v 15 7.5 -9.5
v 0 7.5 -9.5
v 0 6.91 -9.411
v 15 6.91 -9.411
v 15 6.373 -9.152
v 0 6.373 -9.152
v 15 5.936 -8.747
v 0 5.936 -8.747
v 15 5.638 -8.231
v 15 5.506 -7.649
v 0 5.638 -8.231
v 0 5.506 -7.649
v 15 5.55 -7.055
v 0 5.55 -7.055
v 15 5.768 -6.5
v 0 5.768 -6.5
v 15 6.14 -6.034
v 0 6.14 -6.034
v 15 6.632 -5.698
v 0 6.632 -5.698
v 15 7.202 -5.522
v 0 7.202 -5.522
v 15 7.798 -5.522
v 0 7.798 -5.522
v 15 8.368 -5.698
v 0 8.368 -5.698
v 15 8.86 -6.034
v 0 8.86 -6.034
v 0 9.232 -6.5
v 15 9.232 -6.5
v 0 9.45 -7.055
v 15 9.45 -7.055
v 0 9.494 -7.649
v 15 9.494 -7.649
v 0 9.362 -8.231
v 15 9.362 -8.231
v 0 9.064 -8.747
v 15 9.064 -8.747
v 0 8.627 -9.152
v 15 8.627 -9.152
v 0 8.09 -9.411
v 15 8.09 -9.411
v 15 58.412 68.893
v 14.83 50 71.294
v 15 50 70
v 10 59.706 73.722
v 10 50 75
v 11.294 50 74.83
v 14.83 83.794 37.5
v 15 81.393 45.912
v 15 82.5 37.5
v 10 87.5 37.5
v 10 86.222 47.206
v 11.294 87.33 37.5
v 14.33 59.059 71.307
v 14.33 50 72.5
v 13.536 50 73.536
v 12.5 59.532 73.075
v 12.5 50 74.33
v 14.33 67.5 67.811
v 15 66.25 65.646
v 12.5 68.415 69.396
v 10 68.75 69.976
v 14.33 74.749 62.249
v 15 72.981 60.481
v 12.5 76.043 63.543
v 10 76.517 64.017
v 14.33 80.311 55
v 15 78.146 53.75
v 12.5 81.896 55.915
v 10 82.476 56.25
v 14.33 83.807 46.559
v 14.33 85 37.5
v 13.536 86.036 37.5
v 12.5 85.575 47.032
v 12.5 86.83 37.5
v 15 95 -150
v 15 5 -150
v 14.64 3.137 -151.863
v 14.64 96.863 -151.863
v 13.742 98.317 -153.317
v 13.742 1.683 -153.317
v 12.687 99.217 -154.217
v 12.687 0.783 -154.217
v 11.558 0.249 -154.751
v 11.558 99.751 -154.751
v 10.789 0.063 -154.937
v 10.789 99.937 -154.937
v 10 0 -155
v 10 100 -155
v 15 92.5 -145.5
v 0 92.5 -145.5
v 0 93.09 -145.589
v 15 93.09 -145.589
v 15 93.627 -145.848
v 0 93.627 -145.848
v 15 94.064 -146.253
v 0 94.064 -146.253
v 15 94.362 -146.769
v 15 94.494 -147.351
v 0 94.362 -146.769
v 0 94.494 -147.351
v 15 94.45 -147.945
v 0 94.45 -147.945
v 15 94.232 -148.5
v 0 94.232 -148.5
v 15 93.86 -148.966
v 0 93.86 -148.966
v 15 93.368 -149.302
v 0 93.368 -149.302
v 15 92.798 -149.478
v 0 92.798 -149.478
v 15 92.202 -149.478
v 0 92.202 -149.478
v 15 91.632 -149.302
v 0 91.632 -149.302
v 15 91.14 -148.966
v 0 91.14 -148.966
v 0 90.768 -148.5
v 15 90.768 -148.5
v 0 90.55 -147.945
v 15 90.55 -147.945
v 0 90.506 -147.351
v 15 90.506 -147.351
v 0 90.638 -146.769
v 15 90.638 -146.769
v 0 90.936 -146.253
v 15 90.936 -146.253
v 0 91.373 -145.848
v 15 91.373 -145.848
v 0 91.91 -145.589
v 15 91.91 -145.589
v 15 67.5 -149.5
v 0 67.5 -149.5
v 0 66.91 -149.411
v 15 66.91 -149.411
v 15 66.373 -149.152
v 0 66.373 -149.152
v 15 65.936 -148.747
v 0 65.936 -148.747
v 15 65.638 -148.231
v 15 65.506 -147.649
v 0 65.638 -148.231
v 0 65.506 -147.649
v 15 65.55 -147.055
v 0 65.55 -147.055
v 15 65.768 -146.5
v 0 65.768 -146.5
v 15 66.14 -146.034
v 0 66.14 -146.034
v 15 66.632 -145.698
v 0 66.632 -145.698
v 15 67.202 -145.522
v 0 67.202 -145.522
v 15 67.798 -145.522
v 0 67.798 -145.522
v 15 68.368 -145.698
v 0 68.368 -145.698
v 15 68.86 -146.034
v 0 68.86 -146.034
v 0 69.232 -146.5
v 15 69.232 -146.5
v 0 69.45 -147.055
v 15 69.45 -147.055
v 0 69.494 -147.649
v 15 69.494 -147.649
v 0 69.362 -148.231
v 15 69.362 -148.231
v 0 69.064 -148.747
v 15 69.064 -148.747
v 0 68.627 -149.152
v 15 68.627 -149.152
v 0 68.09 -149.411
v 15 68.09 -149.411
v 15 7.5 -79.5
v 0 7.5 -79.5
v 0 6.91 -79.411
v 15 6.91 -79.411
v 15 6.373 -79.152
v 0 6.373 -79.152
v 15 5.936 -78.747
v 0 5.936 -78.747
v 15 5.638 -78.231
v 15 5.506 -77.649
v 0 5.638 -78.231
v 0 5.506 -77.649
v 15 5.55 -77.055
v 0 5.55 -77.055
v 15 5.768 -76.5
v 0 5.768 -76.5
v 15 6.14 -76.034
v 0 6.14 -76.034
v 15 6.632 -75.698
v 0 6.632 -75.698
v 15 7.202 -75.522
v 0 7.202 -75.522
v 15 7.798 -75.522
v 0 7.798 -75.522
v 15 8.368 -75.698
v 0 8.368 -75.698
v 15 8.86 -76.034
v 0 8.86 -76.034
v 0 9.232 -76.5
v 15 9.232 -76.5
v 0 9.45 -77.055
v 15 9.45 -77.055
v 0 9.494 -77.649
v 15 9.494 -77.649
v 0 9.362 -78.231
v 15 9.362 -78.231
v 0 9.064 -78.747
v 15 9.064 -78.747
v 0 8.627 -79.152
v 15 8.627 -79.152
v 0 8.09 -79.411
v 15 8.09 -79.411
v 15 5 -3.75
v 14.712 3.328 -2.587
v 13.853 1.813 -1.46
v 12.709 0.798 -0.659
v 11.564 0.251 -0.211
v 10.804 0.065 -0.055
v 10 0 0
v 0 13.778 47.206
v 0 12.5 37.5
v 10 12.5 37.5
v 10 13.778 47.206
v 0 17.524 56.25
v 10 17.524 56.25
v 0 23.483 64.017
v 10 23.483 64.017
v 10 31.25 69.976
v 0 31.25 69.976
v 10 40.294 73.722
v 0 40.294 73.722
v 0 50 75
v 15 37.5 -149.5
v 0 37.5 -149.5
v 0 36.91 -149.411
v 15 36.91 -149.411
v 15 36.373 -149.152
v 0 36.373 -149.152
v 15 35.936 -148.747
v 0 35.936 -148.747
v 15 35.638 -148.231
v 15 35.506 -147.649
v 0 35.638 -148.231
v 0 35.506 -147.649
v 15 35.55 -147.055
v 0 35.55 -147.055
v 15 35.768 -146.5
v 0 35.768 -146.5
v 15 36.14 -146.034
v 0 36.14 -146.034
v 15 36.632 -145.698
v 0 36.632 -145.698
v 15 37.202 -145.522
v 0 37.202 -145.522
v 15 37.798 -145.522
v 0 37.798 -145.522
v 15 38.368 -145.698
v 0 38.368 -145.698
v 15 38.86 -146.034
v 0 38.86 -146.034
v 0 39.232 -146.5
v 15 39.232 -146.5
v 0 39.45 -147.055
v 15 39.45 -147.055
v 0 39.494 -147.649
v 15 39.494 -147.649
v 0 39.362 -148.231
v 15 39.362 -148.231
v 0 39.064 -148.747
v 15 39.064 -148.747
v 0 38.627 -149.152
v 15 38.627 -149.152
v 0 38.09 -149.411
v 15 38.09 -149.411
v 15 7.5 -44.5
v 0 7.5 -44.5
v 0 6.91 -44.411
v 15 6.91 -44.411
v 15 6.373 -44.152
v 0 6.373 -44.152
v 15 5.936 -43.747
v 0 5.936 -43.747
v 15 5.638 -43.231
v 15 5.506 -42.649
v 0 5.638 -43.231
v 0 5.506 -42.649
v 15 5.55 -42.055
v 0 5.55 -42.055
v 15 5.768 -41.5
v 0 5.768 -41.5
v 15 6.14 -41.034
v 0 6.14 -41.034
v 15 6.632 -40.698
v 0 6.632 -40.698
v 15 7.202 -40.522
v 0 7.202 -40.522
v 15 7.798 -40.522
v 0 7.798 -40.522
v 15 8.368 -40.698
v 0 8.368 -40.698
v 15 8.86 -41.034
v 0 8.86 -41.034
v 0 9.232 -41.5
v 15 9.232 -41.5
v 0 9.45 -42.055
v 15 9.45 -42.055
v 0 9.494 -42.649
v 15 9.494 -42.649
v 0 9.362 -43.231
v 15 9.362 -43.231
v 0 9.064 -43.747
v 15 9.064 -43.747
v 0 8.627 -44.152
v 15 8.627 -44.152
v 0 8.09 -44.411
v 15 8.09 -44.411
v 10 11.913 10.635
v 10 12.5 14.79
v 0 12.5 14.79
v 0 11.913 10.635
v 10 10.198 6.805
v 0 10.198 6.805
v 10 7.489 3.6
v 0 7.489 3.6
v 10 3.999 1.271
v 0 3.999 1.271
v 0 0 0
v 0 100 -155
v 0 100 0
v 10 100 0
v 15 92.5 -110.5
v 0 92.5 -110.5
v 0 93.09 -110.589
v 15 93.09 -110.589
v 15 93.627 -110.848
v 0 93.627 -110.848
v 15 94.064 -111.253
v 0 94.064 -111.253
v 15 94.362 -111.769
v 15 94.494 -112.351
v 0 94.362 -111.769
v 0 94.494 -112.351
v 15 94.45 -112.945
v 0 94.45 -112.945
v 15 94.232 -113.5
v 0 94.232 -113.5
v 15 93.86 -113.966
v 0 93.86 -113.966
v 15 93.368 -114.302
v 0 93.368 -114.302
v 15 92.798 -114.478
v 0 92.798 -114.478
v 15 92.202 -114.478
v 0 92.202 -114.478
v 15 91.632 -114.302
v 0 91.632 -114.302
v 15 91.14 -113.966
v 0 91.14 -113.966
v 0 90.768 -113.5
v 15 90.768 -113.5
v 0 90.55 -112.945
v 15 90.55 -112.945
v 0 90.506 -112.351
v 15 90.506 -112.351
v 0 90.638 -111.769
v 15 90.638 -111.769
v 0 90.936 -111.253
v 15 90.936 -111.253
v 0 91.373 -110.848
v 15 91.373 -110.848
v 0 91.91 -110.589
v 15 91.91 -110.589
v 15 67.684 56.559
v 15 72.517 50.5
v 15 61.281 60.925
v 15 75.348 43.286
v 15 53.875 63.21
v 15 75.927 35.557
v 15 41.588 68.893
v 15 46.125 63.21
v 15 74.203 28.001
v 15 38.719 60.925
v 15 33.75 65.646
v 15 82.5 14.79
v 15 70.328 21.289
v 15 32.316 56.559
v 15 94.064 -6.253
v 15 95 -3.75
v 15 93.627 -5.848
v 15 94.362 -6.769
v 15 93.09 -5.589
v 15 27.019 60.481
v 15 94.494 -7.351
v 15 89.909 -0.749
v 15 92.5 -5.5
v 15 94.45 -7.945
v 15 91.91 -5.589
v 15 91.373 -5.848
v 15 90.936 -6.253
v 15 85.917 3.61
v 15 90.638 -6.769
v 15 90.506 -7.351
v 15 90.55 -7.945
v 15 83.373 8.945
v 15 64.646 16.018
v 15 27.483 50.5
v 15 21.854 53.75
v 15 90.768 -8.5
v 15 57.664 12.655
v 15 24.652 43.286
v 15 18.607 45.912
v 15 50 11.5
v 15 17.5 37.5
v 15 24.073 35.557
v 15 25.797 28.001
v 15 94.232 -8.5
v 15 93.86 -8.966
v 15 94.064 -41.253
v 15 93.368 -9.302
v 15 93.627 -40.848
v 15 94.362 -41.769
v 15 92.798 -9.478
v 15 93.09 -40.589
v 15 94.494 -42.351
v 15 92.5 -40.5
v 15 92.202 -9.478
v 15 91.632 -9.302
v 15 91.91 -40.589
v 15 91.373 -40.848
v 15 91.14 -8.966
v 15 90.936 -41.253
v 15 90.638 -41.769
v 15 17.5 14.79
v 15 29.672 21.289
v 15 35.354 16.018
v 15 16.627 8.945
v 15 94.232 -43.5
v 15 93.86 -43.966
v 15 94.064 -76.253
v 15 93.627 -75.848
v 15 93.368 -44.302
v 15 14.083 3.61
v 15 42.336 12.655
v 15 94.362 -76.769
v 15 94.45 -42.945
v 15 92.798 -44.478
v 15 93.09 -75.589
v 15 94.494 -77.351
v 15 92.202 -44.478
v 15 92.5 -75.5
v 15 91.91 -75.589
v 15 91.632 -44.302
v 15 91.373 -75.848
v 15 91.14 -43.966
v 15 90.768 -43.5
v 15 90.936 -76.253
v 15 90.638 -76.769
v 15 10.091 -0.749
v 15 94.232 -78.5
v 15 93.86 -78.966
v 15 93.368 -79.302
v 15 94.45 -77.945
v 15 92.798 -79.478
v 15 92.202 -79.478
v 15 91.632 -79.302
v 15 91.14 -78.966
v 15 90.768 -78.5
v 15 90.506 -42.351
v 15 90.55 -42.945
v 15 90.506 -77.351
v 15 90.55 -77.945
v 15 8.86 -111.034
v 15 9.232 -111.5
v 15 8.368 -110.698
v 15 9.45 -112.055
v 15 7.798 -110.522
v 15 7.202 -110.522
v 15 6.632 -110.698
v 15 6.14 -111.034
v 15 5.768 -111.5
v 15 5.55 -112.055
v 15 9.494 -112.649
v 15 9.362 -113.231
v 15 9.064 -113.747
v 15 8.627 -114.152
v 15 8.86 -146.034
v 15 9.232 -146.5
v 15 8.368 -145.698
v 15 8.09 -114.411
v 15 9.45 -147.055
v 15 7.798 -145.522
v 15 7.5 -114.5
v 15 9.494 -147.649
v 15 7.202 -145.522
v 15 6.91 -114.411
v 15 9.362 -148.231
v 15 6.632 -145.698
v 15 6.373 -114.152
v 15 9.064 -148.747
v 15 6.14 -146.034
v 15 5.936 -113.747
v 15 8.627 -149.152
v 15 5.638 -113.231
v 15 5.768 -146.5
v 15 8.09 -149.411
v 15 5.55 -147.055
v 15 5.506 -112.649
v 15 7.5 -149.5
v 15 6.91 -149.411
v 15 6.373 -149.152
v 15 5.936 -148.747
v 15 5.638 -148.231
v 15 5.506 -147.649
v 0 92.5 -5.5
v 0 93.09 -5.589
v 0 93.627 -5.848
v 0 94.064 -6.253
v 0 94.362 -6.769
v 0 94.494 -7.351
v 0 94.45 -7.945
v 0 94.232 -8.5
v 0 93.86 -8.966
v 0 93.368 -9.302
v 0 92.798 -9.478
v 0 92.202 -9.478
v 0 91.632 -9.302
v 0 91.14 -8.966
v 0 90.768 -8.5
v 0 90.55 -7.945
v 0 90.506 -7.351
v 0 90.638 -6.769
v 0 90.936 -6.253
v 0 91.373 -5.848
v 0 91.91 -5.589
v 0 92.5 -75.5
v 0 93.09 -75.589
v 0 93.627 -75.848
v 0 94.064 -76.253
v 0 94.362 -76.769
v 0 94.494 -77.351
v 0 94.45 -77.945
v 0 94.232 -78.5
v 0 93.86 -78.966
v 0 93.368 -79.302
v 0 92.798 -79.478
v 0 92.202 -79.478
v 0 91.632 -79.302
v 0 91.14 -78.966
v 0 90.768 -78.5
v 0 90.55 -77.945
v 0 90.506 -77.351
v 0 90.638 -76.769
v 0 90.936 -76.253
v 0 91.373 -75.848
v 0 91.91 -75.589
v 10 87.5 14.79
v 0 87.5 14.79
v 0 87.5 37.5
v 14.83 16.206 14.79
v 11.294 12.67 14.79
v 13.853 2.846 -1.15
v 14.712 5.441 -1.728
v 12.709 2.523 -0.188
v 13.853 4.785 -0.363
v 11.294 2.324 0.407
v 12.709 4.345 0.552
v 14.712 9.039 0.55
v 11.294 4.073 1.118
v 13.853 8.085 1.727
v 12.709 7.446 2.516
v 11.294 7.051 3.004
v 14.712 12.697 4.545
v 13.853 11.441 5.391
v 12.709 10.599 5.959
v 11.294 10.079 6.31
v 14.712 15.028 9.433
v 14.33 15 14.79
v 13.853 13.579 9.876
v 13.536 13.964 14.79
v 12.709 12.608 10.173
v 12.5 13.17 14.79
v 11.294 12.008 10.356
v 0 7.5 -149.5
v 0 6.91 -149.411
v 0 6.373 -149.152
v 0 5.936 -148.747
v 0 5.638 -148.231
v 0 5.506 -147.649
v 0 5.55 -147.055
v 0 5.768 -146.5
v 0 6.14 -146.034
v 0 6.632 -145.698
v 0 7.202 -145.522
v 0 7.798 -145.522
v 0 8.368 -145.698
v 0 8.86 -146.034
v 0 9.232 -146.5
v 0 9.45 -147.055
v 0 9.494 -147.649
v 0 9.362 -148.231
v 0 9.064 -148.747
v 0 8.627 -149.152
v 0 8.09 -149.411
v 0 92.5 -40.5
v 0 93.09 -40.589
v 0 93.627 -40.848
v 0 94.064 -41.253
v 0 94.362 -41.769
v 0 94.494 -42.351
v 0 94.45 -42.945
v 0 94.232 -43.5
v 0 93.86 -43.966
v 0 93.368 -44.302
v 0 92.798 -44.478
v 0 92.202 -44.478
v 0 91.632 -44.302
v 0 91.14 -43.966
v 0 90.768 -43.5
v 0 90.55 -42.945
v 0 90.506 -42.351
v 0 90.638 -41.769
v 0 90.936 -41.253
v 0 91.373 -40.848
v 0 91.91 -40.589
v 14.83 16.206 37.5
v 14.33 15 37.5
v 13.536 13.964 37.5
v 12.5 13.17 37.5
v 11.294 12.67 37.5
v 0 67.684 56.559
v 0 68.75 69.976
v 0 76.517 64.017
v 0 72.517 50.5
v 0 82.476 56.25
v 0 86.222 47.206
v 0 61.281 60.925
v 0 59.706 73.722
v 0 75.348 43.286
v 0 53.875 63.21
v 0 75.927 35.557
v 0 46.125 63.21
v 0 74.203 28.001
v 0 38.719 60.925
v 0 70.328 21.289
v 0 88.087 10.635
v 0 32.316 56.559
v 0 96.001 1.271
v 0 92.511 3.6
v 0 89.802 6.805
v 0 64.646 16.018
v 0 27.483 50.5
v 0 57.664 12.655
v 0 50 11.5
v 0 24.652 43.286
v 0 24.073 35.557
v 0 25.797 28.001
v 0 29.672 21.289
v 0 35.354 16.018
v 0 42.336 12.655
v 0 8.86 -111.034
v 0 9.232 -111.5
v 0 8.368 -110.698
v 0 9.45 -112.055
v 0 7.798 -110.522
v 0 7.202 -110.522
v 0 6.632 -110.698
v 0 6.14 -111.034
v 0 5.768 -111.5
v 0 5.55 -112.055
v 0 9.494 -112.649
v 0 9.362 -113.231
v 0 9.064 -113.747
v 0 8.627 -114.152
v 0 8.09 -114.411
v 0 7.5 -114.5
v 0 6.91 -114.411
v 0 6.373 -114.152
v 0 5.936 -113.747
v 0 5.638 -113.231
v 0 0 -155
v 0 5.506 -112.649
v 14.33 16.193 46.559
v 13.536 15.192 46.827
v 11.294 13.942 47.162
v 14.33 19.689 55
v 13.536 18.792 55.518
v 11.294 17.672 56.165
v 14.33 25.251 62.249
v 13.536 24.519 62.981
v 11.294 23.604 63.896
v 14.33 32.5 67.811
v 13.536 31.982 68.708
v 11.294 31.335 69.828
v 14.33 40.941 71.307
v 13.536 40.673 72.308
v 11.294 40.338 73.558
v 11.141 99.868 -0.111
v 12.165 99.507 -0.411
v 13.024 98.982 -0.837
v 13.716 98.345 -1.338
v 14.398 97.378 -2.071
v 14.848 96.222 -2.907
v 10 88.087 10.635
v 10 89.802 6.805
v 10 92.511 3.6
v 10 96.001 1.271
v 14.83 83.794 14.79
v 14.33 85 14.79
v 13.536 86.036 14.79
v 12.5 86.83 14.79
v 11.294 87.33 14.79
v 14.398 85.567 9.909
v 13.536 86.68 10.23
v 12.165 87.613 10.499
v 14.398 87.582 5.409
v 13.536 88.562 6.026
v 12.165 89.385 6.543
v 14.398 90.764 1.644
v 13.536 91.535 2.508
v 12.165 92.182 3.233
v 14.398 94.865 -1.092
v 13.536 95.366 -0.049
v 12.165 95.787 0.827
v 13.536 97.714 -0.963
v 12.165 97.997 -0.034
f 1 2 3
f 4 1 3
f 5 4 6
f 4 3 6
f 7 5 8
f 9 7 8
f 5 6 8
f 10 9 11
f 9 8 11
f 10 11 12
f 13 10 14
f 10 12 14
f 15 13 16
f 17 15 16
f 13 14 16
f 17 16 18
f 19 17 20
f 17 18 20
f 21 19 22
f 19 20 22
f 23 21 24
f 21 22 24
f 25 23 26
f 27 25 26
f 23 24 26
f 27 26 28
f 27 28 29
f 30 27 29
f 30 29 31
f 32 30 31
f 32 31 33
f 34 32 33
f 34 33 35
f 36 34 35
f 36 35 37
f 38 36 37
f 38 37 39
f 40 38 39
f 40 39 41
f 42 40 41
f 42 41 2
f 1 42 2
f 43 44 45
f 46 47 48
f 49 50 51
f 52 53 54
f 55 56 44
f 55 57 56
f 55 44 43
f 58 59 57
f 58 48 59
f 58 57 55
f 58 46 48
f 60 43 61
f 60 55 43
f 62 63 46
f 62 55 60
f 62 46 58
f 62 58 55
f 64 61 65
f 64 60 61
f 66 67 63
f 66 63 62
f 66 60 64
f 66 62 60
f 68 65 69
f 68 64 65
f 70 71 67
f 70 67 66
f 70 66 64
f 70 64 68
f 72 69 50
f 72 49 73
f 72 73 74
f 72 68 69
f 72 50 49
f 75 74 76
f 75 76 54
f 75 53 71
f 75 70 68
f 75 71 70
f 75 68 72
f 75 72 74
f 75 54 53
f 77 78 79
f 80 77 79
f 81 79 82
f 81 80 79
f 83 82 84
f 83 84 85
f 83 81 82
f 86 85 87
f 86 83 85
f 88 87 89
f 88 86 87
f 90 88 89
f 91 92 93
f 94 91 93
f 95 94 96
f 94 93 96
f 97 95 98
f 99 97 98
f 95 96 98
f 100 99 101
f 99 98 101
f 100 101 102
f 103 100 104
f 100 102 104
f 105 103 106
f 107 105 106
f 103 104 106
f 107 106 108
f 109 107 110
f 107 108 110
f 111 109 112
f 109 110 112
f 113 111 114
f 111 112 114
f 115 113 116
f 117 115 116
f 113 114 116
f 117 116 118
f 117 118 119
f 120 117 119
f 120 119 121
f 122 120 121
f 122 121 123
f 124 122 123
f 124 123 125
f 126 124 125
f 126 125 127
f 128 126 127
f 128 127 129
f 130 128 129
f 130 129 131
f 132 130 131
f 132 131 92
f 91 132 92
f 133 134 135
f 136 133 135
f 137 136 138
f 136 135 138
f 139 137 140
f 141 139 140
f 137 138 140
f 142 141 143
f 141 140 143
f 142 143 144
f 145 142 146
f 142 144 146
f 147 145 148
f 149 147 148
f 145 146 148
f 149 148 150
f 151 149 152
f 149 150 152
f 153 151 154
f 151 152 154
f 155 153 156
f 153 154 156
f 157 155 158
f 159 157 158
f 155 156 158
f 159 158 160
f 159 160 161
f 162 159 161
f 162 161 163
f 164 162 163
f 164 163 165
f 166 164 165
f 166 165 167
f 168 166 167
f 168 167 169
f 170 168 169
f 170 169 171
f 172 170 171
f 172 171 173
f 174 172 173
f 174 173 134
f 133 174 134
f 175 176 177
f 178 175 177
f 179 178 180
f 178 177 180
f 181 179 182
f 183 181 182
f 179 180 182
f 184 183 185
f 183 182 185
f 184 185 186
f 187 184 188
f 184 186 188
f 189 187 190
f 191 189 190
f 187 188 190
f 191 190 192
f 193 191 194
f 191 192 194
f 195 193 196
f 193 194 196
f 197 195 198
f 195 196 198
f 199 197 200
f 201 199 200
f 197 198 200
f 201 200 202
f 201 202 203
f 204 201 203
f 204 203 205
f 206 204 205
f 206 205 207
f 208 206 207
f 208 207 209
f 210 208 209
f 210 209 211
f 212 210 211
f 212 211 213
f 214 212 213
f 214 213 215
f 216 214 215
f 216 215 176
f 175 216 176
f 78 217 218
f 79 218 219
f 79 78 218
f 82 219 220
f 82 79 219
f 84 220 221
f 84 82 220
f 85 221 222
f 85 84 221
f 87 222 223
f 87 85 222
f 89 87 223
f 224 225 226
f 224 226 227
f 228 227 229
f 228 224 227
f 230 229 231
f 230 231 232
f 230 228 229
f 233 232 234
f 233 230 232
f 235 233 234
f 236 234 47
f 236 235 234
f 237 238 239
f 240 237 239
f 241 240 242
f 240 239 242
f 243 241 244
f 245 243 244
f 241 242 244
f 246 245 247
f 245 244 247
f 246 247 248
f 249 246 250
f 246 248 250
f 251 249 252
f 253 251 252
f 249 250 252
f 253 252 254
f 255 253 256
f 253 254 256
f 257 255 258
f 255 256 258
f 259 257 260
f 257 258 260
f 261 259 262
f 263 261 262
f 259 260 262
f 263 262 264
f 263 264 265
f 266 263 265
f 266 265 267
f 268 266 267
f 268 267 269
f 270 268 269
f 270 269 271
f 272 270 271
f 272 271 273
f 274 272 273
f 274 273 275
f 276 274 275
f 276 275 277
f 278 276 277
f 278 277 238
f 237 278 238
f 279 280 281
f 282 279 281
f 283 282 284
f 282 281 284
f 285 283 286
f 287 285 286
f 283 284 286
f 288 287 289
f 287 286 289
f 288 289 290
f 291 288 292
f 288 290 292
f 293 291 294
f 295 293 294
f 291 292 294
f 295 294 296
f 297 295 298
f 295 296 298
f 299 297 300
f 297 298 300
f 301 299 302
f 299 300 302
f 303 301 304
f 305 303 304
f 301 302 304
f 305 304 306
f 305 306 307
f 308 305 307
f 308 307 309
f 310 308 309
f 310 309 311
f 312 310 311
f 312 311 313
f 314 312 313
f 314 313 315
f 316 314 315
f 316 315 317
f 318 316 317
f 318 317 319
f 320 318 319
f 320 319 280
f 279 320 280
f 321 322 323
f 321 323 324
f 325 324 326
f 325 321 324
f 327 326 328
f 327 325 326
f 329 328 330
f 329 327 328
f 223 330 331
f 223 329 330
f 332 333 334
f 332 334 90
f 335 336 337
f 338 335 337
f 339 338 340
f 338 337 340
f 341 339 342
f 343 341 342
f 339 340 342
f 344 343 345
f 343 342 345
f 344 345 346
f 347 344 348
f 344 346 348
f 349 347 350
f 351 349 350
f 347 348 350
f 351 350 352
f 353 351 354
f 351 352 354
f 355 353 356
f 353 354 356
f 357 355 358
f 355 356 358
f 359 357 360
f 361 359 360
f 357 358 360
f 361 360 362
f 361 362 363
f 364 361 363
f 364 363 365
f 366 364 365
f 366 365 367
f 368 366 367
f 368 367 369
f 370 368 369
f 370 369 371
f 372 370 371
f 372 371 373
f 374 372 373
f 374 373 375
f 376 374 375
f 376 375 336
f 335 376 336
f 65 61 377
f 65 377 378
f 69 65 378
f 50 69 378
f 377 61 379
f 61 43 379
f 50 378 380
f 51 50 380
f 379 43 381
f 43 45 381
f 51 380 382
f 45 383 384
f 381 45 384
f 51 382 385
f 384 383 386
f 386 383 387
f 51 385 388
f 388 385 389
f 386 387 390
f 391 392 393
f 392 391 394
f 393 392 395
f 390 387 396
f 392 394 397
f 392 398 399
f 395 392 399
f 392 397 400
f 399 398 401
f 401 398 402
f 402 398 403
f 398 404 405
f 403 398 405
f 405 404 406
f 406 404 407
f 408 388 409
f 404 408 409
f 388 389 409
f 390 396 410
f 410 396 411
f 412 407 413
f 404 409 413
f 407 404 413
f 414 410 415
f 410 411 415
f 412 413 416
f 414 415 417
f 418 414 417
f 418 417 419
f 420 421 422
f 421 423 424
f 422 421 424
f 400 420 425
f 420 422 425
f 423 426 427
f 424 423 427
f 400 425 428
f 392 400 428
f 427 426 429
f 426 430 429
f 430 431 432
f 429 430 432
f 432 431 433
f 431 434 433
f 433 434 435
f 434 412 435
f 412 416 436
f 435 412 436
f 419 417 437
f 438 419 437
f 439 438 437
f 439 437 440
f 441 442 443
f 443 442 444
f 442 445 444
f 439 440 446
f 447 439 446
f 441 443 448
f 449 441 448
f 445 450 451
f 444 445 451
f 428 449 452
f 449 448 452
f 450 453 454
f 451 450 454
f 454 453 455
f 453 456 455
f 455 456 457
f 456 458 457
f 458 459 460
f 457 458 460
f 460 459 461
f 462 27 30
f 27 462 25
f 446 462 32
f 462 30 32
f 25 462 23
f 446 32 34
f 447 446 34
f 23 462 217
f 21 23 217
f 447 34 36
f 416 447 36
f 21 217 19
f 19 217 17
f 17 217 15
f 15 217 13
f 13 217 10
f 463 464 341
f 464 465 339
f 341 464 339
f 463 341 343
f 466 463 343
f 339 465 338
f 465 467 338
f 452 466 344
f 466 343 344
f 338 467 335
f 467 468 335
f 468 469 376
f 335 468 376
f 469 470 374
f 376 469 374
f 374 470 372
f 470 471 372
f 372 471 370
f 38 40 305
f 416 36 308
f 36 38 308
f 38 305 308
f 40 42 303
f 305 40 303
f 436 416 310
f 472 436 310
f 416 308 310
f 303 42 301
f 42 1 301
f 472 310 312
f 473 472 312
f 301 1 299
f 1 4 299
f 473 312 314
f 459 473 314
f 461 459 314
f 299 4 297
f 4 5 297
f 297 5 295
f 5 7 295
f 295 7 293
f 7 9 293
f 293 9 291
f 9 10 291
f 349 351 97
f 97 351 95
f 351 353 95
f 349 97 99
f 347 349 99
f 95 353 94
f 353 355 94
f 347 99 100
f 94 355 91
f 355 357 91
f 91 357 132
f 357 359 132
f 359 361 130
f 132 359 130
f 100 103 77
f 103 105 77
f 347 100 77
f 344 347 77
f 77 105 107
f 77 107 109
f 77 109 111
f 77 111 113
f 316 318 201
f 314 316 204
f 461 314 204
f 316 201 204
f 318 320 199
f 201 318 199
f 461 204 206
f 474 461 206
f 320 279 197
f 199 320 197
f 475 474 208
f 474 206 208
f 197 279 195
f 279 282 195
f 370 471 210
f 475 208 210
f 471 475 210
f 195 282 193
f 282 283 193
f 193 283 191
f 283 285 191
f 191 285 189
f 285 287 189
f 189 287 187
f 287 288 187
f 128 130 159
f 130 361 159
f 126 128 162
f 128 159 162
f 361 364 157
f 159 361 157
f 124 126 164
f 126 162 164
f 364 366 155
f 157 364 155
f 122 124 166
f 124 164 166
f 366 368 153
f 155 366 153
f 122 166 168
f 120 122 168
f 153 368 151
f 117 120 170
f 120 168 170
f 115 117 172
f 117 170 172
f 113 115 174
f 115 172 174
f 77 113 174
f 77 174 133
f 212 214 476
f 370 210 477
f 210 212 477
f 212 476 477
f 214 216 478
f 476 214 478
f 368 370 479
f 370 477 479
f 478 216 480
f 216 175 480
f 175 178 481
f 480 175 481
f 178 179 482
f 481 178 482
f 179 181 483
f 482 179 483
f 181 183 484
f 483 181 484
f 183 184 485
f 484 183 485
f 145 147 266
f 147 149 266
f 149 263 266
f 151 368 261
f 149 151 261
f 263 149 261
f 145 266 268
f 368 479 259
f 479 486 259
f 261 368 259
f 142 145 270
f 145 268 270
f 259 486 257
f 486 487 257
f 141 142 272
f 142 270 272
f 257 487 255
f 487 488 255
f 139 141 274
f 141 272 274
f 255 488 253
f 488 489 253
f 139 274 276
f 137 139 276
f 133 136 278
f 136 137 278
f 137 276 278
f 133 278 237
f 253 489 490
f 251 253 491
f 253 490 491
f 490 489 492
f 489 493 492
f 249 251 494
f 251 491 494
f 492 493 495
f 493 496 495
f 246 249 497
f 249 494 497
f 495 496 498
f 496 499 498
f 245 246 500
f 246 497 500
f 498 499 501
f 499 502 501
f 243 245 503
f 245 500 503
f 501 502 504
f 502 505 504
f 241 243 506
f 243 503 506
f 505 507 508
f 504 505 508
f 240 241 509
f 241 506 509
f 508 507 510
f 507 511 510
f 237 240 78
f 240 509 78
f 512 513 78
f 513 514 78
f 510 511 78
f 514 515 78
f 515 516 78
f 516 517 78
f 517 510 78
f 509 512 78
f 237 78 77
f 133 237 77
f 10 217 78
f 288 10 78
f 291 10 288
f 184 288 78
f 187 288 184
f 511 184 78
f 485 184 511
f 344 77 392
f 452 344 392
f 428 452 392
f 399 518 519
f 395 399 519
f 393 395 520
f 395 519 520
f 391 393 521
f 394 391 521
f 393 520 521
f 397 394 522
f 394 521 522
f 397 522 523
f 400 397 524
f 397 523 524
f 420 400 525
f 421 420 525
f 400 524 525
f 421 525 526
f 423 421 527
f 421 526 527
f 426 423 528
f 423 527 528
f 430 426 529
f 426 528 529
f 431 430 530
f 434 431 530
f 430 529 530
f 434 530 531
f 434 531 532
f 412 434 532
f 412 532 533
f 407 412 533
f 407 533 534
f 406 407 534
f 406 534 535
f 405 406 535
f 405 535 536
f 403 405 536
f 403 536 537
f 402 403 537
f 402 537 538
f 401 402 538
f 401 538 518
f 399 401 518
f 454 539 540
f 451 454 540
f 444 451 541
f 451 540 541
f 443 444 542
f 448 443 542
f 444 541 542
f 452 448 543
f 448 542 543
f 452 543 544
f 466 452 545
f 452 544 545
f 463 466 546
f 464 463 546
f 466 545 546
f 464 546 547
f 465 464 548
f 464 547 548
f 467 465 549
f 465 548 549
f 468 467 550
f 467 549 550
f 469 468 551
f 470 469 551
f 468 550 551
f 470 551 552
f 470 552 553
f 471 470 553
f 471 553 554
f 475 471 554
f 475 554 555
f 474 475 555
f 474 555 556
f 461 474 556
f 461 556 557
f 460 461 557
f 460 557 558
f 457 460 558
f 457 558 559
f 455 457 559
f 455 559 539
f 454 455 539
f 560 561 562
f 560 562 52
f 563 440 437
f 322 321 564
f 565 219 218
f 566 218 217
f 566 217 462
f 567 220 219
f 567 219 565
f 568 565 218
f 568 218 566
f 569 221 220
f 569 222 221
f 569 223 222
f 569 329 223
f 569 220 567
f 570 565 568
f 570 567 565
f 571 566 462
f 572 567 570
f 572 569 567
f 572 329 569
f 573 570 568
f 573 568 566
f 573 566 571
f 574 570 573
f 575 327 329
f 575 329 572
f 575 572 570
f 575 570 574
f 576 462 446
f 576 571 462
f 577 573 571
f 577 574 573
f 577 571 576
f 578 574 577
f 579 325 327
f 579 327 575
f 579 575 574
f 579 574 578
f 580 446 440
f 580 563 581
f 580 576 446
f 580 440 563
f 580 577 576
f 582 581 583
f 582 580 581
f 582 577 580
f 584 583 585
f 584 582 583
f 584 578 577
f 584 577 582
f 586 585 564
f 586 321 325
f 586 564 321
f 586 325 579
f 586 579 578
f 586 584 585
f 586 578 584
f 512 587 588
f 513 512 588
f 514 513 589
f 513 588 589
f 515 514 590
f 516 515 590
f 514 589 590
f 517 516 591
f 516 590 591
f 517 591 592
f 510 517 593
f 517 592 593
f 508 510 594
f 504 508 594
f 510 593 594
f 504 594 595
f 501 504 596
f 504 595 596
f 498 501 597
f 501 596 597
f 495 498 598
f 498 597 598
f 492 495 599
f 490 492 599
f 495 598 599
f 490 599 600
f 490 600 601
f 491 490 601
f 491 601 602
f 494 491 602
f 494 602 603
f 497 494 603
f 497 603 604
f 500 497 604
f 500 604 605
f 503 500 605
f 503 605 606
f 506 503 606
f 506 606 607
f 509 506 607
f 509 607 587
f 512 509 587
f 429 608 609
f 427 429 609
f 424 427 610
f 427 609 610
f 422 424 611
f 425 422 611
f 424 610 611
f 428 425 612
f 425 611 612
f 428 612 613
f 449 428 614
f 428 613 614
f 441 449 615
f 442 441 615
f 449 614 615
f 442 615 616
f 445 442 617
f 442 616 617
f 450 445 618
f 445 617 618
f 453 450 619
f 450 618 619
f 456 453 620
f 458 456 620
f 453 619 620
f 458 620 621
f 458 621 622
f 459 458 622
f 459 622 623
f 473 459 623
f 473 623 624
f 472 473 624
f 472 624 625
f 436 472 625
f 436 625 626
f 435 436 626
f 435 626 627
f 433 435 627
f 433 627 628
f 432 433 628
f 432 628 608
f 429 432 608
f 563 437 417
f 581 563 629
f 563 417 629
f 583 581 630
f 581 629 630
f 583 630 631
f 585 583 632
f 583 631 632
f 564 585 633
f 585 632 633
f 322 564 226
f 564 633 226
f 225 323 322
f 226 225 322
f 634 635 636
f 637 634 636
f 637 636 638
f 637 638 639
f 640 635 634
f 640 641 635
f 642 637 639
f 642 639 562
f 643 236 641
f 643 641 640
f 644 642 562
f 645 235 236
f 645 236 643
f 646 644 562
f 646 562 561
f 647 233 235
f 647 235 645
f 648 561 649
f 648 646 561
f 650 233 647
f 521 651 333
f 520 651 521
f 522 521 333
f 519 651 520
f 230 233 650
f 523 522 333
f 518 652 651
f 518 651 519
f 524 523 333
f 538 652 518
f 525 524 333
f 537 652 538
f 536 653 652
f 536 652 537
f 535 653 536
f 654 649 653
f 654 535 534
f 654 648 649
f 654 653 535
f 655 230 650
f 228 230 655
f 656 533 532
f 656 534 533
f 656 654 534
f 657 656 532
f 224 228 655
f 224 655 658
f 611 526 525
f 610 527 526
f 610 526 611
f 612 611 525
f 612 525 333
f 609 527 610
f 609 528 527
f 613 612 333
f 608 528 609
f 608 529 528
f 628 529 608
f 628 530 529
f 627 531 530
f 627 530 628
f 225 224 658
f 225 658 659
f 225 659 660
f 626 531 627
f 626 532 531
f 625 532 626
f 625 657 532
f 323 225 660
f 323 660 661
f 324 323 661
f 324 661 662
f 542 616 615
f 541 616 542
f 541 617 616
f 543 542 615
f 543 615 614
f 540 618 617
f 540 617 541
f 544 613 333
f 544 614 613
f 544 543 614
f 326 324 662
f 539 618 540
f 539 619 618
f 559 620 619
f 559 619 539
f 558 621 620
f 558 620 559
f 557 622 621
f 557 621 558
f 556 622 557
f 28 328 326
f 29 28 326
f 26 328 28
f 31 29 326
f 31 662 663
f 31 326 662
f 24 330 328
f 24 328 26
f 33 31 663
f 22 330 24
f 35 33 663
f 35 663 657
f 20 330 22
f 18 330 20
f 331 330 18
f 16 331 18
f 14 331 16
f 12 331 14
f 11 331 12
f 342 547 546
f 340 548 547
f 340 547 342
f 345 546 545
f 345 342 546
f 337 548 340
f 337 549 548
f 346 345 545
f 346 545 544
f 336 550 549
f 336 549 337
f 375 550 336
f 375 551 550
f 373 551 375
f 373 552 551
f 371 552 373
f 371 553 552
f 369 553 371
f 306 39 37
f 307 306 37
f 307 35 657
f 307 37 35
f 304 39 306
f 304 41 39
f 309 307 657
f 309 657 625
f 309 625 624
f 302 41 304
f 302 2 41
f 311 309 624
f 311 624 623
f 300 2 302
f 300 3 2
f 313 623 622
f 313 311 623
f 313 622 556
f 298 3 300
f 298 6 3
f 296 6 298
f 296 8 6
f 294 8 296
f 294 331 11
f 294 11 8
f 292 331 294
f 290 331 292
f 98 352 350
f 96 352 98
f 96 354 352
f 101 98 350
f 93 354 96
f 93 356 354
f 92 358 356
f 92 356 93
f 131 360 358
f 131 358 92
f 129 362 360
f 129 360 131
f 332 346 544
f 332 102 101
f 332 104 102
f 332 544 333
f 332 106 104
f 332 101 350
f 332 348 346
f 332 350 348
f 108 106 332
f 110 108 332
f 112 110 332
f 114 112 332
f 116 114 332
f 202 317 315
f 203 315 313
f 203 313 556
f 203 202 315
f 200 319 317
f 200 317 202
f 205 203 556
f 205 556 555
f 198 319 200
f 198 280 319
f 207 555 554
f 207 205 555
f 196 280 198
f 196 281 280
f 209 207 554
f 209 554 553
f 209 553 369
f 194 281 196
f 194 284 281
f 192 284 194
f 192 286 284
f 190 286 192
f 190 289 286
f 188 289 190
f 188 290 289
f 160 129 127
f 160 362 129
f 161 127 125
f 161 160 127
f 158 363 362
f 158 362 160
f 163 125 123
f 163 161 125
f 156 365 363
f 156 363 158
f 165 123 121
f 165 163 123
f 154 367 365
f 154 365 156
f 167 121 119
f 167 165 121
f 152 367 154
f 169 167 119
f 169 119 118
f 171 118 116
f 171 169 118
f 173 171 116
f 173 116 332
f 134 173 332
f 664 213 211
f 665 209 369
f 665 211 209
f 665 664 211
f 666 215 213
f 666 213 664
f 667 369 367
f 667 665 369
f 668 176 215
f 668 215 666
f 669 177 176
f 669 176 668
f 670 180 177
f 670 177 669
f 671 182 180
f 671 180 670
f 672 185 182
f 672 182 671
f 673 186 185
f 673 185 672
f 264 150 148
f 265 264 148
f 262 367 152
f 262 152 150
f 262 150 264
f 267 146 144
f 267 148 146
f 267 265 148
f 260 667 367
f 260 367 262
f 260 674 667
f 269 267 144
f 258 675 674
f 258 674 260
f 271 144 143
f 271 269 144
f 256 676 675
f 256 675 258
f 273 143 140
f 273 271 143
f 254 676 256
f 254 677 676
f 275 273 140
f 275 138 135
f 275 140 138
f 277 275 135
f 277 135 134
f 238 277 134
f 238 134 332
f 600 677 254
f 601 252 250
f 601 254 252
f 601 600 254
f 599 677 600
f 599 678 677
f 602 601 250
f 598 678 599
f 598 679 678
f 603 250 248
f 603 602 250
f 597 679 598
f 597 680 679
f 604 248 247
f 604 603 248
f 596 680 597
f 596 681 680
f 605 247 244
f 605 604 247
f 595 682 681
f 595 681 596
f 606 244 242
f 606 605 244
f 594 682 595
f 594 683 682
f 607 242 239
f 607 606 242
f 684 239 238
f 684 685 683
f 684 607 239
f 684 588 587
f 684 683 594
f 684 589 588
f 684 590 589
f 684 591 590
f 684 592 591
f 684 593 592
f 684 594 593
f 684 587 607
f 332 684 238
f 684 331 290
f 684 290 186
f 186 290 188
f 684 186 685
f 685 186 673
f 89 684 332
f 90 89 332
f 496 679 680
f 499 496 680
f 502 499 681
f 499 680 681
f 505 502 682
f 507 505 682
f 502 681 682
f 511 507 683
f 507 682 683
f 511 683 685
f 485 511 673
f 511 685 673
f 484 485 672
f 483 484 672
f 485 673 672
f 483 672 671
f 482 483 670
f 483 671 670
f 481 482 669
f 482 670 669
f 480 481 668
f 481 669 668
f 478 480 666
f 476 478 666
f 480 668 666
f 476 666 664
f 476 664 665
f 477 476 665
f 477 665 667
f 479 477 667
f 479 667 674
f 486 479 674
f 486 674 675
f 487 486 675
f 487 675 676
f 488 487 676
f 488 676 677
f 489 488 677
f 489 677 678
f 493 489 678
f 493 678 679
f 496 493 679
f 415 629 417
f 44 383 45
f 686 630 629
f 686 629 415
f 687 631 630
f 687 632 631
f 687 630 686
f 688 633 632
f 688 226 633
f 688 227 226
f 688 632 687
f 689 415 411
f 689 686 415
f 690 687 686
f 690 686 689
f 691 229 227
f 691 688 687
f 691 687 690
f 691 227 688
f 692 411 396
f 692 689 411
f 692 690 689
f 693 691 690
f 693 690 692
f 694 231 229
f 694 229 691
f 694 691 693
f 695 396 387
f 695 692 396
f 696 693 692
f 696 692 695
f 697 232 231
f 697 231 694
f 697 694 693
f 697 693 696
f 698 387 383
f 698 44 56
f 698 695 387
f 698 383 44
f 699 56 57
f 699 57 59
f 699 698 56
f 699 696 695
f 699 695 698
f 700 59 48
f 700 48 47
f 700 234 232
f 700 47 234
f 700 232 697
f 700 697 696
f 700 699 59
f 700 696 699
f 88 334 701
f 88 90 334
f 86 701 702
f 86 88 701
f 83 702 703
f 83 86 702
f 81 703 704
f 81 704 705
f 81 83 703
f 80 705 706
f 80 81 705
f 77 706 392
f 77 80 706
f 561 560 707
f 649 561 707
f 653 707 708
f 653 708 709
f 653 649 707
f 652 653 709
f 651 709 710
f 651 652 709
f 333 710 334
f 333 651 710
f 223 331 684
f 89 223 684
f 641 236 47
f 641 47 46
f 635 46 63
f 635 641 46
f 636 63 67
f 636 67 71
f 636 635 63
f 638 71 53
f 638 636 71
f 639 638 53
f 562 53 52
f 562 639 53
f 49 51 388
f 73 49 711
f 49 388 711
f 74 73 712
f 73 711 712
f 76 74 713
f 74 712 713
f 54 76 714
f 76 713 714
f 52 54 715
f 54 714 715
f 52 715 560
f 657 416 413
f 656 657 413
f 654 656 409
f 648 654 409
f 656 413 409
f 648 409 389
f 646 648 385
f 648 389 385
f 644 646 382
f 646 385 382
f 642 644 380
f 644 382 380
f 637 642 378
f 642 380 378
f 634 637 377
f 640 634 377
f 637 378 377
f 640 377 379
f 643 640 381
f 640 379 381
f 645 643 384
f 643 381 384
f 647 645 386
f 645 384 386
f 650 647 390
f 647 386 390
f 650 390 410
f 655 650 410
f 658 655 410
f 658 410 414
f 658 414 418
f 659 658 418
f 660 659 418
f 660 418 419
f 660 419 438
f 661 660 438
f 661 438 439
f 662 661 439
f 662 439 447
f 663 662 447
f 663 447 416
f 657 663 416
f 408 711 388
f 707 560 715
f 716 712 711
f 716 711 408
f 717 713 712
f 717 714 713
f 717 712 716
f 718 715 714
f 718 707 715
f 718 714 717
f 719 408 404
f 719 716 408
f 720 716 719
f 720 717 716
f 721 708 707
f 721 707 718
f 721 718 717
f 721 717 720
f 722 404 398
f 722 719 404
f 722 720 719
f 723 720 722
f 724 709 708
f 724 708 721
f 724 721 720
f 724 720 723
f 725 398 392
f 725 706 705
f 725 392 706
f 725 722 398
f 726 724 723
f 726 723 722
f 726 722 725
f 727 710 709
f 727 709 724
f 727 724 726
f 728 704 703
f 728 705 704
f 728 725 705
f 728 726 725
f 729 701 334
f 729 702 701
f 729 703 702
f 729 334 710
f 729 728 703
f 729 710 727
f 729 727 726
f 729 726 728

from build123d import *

# Parameters (mm, degrees)
SKETCH1_W           = 155
SKETCH1_H           = 100
BOSS_EXTRUDE1_DEPTH = 15
SKETCH2_W           = 15
SKETCH2_H           = 75
BOSS_EXTRUDE2_DEPTH = 75
SKETCH3_R           = 26
CUT_EXTRUDE1_DEPTH  = 75
CUT_EXTRUDE2_START  = -15
CUT_EXTRUDE2_DEPTH  = 15
FILLET1_R           = 15
SKETCH5_R           = 2
CUT_EXTRUDE3_DEPTH  = 186.067555233
FILLET7_R           = 5


# Read off the part's stored shape, not the designer's step: Cut-Extrude2
with BuildPart() as part:
    # Sketch1 → Boss-Extrude1 (new body)
    with BuildSketch(Plane(origin=(0, 0, 0), x_dir=(0, 0, -1), z_dir=(1, 0, 0))):
        with Locations((77.5, 50)):
            Rectangle(SKETCH1_W, SKETCH1_H)
    extrude(amount=BOSS_EXTRUDE1_DEPTH)

    # Sketch2 → Boss-Extrude2 (add)
    with BuildSketch(Plane.XY):
        with Locations((7.5, 50)):
            Rectangle(SKETCH2_W, SKETCH2_H)
    extrude(amount=BOSS_EXTRUDE2_DEPTH)

    # Sketch3 → Cut-Extrude1 (cut)
    with BuildSketch(Plane(origin=(15, 0, 0), x_dir=(0, 0, -1), z_dir=(1, 0, 0))):
        with Locations((-37.5, 50)):
            Circle(SKETCH3_R)
    extrude(amount=-CUT_EXTRUDE1_DEPTH, mode=Mode.SUBTRACT)

    # Cut-Extrude2 outline → Cut-Extrude2 (cut)
    with BuildSketch(Plane(origin=(15, 0, 0), x_dir=(0, 0, -1), z_dir=(1, 0, 0)).offset(CUT_EXTRUDE2_START)):
        with BuildLine():
            Line((-75, 12.5), (-37.5, 12.5))
            ThreePointArc((-37.5, 12.5), (-64.016504294, 23.483495706), (-75, 50))
            Line((-75, 50), (-75, 12.5))
        make_face()
        with BuildLine():
            Line((-75, 87.5), (-75, 50))
            ThreePointArc((-75, 50), (-64.016504294, 76.516504294), (-37.5, 87.5))
            Line((-37.5, 87.5), (-75, 87.5))
        make_face()
    extrude(amount=CUT_EXTRUDE2_DEPTH, mode=Mode.SUBTRACT)

    # Fillet1
    # the kernel refuses this fillet: 15 mm, written as the material it adds along each edge
    with BuildSketch(Plane(origin=(15, 12.5, 0), x_dir=(0, -1, 0), z_dir=(-1, 0, 0))) as fillet1_piece_1:
        with BuildLine():
            CenterArc((15, 14.790199458), FILLET1_R, 180, 80.405931773)
            Line((0, 14.790199458), (-0.3, 14.790199458))
            Line((-0.3, 14.790199458), (-0.3, 0))
            Line((-0.3, 0), (0, -0.3))
            ThreePointArc((0, -0.3), (6.25, -0.3), (12.45, -0.295803989))
            Line((12.45, -0.295803989), (12.5, 0))
        make_face()
    extrude(amount=15)
    with BuildSketch(Plane(origin=(0, 87.5, 0), x_dir=(0, 0, 1), z_dir=(1, 0, 0))) as fillet1_piece_2:
        with BuildLine():
            CenterArc((14.790199458, -15), FILLET1_R, 90, 80.405931773)
            Line((0, -12.5), (-0.295803989, -12.45))
            ThreePointArc((-0.295803989, -12.45), (-0.3, -6.25), (-0.3, 0))
            Line((-0.3, 0), (0, 0.3))
            Line((0, 0.3), (14.790199458, 0.3))
            Line((14.790199458, 0.3), (14.790199458, 0))
        make_face()
    extrude(amount=15)

    # Sketch5 → Cut-Extrude3 (cut, through all)
    with BuildSketch(Plane.ZY):
        with Locations((-147.5, 92.5)):
            Circle(SKETCH5_R)
        with Locations((-112.5, 92.5)):
            Circle(SKETCH5_R)
        with Locations((-77.5, 92.5)):
            Circle(SKETCH5_R)
        with Locations((-42.5, 92.5)):
            Circle(SKETCH5_R)
        with Locations((-7.5, 92.5)):
            Circle(SKETCH5_R)
        with Locations(Location((-7.5, 7.5, 0), (0, 0, 180))):
            Circle(SKETCH5_R)
        with Locations(Location((-42.5, 7.5, 0), (0, 0, 180))):
            Circle(SKETCH5_R)
        with Locations(Location((-77.5, 7.5, 0), (0, 0, 180))):
            Circle(SKETCH5_R)
        with Locations(Location((-112.5, 7.5, 0), (0, 0, 180))):
            Circle(SKETCH5_R)
        with Locations(Location((-147.5, 7.5, 0), (0, 0, 180))):
            Circle(SKETCH5_R)
        with Locations(Location((-147.5, 37.5, 0), (0, 0, 180))):
            Circle(SKETCH5_R)
        with Locations(Location((-147.5, 67.5, 0), (0, 0, 180))):
            Circle(SKETCH5_R)
    extrude(amount=-CUT_EXTRUDE3_DEPTH, mode=Mode.SUBTRACT)

    # Fillet7
    fillet7_edges = [part.edges().sort_by_distance(p)[0] for p in [
        (15, 50, -155),
        (15, 100, -77.5),
        (15, 12.5, 26.145099729),
        (15, 87.5, 26.145099729),
        (15, 76.516504294, 64.016504294),
        (15, 8.956439237, 5.107741092),
        (15, 91.043560763, 5.107741092),
        (15, 0, -77.5),
    ]]
    fillet(fillet7_edges, radius=FILLET7_R)


solid = part.part
